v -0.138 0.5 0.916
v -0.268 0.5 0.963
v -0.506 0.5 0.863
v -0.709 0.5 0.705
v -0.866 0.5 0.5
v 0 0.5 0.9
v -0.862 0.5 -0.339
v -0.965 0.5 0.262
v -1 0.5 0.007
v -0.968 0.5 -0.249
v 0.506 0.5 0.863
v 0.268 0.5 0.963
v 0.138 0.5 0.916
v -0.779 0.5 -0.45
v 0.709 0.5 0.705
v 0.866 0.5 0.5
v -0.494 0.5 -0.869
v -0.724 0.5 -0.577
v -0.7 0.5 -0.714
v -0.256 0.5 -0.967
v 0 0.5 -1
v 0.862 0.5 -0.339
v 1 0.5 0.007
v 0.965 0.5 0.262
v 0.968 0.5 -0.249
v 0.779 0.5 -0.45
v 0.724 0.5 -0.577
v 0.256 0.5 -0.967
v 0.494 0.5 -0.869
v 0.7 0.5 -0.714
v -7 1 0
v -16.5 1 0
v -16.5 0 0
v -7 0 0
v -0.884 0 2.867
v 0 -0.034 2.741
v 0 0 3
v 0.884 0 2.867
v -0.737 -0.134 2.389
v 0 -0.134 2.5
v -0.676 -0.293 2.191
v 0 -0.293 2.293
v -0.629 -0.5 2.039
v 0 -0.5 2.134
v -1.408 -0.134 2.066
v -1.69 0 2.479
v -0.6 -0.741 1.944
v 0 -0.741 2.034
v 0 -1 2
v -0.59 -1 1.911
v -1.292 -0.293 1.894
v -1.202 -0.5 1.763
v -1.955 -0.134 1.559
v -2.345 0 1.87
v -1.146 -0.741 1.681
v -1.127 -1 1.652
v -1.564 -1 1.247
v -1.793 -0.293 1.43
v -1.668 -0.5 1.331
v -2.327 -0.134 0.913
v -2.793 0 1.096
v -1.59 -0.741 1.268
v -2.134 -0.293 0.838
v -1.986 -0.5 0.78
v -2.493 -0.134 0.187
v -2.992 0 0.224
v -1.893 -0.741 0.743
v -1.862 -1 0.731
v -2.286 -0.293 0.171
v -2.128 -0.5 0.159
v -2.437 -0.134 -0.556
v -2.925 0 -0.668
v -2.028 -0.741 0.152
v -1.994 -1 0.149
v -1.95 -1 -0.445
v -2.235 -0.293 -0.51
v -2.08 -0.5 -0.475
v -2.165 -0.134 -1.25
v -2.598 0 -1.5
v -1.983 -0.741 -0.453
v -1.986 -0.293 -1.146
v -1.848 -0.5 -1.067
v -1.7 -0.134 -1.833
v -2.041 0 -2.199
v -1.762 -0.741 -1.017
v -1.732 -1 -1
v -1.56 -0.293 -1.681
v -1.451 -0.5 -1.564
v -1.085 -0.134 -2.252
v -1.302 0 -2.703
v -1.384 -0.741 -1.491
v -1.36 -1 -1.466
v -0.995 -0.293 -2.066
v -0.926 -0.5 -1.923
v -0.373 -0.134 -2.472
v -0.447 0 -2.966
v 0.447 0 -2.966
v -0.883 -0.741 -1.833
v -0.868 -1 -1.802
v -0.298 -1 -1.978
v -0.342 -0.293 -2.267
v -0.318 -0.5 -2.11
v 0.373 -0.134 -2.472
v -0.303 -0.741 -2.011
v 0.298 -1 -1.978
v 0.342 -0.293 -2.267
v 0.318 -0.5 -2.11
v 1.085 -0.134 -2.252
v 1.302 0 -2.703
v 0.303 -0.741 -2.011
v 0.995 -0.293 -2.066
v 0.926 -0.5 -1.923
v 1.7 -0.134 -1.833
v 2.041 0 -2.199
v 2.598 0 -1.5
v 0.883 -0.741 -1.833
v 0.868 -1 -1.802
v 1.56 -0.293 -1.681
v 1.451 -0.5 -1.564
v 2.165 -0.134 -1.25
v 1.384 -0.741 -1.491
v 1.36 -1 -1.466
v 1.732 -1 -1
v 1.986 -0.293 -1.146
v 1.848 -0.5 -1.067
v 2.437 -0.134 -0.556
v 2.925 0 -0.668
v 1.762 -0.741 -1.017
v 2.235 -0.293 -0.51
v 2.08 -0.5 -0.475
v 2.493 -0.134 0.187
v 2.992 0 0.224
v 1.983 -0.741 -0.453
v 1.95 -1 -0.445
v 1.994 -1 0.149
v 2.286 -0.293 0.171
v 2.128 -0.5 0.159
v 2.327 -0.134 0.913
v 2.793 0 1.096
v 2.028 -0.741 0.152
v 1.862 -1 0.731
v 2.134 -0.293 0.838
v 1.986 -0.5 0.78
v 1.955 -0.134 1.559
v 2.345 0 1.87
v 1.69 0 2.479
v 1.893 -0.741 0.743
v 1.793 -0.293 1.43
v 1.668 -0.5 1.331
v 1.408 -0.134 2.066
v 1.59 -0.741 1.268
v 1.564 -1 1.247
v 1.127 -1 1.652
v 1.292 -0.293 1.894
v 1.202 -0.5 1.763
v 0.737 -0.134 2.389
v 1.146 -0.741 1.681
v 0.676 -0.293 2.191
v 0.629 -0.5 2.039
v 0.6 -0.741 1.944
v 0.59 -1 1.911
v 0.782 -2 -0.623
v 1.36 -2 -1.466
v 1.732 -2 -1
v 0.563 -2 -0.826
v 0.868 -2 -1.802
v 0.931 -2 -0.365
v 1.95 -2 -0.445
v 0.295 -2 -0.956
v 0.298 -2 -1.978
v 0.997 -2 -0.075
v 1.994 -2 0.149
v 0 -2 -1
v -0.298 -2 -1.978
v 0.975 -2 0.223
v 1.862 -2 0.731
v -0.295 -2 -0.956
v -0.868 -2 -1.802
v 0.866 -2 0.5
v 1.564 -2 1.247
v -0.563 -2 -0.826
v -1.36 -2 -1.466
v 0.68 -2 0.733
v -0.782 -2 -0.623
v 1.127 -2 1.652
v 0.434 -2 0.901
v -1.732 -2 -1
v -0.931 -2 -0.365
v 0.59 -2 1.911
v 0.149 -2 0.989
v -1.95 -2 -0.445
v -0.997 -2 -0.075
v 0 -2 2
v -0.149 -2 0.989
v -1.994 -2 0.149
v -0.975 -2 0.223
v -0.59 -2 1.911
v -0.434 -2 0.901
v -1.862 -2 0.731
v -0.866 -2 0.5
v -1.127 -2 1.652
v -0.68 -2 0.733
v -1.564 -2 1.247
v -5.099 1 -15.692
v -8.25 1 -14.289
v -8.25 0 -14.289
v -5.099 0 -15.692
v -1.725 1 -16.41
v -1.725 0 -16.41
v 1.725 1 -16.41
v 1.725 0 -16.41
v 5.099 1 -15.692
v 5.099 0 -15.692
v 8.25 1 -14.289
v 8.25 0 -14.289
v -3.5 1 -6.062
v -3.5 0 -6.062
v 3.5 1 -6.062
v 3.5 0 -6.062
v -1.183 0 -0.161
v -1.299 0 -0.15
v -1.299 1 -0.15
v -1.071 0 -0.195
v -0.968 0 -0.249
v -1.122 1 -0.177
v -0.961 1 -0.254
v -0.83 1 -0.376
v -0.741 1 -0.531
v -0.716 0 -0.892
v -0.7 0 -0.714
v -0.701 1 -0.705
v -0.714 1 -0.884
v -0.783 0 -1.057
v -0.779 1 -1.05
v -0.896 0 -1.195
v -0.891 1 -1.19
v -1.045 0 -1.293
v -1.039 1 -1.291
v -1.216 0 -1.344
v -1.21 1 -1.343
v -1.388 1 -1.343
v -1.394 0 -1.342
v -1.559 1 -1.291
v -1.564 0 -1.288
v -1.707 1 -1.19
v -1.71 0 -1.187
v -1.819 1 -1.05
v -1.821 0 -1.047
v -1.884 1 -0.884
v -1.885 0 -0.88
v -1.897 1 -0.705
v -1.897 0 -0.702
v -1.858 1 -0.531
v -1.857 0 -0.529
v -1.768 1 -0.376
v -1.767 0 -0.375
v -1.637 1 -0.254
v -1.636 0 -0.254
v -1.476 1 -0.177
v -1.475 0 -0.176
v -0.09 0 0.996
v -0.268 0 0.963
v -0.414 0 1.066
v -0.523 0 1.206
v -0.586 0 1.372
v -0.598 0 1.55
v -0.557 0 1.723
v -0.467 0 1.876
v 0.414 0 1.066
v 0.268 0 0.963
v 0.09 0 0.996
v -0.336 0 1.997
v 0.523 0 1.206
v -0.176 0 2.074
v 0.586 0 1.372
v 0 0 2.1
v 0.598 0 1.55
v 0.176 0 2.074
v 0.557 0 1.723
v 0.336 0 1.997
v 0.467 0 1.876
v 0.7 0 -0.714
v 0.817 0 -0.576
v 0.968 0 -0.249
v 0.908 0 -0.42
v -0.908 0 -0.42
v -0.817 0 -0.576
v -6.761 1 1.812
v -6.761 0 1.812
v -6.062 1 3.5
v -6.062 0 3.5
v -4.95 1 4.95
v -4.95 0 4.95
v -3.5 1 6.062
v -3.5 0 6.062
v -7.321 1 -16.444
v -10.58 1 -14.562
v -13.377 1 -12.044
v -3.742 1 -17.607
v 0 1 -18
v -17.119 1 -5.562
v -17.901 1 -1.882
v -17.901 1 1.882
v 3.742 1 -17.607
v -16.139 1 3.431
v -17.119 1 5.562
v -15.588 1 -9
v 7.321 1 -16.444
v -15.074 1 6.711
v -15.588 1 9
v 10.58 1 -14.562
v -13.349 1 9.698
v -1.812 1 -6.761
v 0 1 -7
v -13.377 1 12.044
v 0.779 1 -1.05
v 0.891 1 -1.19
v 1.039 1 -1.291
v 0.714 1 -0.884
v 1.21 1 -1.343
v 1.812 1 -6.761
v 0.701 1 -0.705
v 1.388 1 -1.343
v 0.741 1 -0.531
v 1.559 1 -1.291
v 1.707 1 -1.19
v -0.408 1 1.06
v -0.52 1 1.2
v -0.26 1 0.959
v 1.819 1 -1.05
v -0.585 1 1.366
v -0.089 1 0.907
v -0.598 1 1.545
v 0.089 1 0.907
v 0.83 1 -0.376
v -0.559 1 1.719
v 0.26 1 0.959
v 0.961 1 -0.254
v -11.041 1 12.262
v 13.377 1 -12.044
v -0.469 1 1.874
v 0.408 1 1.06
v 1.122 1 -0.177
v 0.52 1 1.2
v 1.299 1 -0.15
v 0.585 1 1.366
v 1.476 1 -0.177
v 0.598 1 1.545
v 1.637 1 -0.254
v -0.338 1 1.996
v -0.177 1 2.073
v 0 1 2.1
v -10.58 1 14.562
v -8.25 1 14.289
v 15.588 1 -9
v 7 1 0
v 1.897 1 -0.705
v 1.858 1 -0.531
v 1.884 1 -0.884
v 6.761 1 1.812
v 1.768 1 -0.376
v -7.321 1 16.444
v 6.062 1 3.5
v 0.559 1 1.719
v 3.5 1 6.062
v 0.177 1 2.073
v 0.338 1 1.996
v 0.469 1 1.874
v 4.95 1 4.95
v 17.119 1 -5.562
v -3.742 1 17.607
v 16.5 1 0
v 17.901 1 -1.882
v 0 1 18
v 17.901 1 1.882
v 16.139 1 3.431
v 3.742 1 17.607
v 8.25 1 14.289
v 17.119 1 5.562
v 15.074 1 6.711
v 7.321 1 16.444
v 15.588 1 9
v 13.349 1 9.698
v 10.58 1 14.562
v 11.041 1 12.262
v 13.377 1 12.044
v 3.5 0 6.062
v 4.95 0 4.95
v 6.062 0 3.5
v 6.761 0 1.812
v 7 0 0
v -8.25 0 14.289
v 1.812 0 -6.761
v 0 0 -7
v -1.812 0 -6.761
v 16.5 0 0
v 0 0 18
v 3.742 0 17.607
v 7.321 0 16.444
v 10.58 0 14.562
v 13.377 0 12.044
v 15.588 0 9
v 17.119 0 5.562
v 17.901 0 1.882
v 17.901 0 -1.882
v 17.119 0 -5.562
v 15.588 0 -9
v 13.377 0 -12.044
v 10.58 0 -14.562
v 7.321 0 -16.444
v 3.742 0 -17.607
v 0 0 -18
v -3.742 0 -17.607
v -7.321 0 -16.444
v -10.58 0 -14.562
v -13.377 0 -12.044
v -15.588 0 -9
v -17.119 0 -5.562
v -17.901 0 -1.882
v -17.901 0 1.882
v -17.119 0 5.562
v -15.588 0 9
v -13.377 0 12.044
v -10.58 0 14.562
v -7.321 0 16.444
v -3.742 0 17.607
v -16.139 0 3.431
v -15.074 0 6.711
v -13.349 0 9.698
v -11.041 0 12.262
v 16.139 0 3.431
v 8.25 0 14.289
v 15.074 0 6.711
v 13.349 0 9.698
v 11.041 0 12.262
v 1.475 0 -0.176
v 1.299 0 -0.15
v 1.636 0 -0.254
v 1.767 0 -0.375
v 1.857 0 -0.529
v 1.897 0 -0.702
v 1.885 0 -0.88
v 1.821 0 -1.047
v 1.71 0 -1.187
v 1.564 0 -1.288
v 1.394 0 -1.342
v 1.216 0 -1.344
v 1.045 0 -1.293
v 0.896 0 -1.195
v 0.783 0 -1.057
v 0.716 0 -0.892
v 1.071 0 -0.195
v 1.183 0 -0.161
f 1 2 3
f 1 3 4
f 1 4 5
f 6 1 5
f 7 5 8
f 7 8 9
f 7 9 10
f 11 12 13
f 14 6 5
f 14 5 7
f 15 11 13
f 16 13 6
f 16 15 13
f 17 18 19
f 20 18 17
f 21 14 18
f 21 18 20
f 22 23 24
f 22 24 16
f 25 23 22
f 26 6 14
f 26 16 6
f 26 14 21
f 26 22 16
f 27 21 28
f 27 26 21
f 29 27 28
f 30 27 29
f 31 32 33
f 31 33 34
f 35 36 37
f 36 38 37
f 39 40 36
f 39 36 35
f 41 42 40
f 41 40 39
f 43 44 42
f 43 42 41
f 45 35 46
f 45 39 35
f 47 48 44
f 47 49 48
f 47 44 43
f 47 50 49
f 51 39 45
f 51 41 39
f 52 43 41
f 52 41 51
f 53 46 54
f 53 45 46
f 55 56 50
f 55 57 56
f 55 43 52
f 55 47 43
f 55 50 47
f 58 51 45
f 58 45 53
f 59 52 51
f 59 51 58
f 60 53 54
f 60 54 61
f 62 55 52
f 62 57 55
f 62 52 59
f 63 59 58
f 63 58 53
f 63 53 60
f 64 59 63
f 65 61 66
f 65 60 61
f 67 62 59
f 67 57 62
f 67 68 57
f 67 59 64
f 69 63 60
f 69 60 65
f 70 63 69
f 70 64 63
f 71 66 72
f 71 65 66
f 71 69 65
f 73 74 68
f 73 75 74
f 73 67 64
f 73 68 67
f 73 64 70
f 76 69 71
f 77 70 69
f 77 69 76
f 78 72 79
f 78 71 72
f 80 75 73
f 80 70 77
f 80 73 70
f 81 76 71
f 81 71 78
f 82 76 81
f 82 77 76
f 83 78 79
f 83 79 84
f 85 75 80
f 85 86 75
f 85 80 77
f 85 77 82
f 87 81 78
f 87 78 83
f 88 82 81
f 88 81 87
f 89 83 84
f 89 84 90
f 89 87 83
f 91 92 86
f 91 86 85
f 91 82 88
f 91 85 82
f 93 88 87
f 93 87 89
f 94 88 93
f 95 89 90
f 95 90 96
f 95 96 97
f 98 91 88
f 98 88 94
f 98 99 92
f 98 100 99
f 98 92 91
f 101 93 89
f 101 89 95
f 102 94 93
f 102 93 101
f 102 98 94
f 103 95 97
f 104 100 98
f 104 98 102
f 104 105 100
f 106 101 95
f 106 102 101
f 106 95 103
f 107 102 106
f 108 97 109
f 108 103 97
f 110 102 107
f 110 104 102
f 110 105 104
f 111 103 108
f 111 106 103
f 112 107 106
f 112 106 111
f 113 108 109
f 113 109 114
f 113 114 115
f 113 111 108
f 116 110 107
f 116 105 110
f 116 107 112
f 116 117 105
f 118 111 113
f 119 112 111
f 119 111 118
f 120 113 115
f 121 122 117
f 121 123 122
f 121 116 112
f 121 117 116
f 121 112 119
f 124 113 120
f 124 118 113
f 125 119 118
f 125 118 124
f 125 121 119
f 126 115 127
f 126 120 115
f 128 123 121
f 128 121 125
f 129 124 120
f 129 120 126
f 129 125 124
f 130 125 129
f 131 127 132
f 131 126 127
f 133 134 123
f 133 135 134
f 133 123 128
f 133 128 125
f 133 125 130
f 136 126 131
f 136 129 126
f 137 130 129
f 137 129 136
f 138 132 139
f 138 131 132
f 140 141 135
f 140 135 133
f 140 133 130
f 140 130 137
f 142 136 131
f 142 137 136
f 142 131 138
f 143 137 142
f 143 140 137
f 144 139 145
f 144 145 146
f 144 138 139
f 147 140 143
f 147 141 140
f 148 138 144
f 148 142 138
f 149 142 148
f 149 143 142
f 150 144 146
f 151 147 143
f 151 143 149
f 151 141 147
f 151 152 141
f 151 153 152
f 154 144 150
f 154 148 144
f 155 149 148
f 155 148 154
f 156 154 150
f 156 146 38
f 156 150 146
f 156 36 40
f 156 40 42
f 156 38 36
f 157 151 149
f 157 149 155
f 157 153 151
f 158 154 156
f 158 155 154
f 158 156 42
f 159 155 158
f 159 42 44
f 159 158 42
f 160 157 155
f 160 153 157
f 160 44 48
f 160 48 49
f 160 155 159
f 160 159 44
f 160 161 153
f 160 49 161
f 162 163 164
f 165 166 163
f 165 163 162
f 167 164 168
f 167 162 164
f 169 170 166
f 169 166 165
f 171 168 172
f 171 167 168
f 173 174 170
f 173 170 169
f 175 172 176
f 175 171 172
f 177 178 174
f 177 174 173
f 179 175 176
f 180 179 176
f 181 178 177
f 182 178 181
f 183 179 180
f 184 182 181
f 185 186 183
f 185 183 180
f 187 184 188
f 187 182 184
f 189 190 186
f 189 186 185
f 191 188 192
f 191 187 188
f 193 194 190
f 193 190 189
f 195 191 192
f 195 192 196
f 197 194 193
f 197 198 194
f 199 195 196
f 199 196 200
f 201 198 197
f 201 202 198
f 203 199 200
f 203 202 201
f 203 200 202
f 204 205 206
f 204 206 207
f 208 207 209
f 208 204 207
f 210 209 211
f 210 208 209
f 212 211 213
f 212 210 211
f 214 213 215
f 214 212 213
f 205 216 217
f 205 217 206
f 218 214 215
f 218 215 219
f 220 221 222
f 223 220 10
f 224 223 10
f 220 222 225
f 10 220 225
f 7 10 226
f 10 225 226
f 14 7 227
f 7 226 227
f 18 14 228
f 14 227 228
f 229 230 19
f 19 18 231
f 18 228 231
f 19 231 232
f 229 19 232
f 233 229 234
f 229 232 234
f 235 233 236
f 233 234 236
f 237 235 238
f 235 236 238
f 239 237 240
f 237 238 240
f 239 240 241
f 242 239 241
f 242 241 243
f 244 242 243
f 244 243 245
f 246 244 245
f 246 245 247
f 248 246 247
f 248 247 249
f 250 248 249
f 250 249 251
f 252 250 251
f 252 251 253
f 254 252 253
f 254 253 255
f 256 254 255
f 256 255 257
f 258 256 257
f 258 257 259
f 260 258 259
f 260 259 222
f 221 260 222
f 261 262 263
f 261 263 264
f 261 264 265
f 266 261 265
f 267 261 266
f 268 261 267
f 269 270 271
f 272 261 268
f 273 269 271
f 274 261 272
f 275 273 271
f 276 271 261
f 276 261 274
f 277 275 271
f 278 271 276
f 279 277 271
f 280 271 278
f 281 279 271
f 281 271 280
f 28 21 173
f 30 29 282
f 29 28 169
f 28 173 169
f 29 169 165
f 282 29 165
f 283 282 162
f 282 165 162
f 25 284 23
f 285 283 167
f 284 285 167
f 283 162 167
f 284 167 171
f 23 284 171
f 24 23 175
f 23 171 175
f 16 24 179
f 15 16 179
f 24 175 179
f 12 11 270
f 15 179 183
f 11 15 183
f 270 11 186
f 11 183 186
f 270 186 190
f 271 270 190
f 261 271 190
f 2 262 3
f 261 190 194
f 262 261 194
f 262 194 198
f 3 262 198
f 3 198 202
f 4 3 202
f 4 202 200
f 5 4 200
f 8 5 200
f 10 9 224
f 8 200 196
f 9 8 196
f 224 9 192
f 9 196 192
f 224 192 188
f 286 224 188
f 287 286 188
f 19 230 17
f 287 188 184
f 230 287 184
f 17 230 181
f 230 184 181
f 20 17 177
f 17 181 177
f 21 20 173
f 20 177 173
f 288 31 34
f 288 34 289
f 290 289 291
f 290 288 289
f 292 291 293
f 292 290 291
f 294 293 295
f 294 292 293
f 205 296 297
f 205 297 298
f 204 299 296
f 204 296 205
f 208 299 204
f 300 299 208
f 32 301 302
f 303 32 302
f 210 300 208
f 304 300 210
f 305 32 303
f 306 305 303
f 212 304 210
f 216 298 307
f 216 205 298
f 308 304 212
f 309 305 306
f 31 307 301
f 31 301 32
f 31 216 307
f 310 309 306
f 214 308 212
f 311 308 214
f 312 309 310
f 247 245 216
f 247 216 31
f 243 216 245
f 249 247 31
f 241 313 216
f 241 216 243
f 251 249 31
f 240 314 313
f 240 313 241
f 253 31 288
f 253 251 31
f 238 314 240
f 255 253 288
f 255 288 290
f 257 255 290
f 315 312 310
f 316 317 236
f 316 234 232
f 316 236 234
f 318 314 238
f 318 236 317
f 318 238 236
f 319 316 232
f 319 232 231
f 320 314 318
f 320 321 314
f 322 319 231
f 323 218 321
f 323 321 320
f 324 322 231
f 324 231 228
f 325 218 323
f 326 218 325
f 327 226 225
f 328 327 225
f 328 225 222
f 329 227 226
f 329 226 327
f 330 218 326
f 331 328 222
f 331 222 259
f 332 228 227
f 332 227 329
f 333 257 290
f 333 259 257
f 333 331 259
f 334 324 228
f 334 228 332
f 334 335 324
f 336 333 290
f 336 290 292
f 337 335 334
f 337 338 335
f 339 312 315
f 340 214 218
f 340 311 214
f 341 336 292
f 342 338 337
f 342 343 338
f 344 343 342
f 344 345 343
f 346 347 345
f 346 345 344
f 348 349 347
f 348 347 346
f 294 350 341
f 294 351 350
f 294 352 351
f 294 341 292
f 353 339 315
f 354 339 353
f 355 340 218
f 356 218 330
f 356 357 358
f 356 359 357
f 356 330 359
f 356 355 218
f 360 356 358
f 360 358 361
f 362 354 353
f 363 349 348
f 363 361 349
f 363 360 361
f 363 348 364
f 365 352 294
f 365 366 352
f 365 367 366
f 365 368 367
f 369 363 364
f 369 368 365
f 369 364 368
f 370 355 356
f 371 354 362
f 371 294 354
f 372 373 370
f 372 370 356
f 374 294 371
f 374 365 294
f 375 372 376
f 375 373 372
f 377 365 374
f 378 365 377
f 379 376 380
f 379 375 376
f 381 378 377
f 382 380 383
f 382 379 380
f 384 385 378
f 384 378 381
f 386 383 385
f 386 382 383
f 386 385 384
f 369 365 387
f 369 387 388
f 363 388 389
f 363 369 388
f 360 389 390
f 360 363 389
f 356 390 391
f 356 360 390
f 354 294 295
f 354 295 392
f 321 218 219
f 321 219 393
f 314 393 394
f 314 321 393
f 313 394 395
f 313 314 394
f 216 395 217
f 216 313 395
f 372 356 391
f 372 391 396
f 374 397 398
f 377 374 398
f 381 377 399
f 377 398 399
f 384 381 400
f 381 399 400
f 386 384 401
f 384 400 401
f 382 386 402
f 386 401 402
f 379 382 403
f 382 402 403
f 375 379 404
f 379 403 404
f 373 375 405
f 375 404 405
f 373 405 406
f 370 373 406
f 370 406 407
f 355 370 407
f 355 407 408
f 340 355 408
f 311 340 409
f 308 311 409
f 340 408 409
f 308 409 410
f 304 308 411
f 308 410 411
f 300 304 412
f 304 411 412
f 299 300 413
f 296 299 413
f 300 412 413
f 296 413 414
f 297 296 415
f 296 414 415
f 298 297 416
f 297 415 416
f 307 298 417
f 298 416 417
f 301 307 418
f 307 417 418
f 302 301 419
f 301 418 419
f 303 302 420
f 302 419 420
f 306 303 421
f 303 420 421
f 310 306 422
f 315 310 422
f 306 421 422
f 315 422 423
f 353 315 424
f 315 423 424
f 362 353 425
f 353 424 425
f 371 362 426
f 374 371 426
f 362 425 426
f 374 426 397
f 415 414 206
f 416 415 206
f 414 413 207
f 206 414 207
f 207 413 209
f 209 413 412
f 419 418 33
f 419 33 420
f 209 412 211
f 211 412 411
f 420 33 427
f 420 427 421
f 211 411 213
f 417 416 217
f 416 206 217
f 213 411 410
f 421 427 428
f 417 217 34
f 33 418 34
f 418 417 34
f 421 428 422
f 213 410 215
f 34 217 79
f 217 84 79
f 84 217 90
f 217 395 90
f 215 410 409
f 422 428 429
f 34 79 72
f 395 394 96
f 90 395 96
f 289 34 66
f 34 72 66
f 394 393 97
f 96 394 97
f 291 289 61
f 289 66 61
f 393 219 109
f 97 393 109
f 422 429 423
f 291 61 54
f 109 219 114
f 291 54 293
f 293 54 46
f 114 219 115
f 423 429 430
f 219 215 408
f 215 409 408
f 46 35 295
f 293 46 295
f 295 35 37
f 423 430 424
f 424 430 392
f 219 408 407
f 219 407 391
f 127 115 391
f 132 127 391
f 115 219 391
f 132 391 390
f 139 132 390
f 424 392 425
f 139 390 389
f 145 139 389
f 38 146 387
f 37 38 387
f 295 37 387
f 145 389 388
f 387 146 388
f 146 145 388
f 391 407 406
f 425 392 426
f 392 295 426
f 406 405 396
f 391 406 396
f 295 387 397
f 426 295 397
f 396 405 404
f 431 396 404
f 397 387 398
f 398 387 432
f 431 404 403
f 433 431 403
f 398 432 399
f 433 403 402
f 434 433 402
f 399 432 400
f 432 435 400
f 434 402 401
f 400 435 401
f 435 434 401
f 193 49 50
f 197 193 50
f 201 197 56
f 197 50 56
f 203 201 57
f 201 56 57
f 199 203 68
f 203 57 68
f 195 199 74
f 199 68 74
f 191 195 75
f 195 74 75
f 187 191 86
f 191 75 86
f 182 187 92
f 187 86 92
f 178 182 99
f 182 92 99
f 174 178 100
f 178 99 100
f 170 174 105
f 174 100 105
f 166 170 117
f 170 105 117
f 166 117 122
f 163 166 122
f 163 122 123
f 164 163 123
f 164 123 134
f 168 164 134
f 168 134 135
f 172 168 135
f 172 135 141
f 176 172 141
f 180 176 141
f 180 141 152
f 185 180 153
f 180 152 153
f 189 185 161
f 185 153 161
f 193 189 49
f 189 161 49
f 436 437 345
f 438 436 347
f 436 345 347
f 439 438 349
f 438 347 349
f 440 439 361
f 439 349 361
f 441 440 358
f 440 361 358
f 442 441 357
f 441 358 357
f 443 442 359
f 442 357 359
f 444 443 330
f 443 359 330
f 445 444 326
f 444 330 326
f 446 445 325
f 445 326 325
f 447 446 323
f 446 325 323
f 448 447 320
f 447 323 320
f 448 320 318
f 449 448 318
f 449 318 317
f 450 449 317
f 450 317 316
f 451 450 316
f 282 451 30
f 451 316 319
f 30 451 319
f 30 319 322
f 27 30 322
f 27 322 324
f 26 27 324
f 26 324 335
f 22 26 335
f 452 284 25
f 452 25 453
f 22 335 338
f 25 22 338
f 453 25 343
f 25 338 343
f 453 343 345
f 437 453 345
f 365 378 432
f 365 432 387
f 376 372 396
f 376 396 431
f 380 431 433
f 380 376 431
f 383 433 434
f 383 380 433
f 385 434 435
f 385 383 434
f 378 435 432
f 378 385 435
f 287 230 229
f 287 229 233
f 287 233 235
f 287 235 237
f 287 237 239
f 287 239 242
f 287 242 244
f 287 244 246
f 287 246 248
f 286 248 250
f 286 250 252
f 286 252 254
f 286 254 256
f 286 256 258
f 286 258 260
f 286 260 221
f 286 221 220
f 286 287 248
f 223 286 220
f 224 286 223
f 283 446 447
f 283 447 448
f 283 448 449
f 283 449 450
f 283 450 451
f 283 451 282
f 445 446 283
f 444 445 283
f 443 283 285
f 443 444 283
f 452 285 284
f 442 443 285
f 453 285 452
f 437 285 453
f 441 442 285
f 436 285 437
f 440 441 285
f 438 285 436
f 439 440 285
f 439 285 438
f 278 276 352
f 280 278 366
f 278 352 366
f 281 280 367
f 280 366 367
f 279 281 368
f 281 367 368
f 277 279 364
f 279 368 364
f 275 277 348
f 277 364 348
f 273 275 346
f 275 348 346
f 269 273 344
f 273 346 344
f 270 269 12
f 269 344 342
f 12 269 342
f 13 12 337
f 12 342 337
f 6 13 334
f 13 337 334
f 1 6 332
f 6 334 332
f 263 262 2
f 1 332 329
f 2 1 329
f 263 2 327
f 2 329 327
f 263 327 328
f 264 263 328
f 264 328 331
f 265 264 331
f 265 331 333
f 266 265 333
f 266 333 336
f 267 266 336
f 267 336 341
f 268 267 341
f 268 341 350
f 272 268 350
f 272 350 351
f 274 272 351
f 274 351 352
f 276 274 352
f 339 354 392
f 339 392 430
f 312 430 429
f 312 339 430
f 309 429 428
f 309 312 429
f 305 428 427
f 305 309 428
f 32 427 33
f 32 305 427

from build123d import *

# Parameters (mm, degrees)
SKETCH1_R           = 18
BOSS_EXTRUDE1_DEPTH = 1
SKETCH2_R           = 2
BOSS_EXTRUDE2_DEPTH = 2
SKETCH3_R           = 1
CUT_EXTRUDE1_DEPTH  = 2.5
FILLET1_R           = 1
SKETCH4_R           = 0.6
CUT_EXTRUDE2_DEPTH  = 1


with BuildPart() as part:
    # Sketch1 → Boss-Extrude1 (new body)
    with BuildSketch(Plane(origin=(0, 0, 0), x_dir=(1, 0, 0), z_dir=(0, 1, 0))):
        with Locations(Location((0, 0, 0), (0, 0, 270))):
            Circle(SKETCH1_R)
    extrude(amount=BOSS_EXTRUDE1_DEPTH)

    # Sketch2 → Boss-Extrude2 (add)
    with BuildSketch(Plane.XZ):
        with Locations(Location((0, 0, 0), (0, 0, 90))):
            Circle(SKETCH2_R)
    extrude(amount=BOSS_EXTRUDE2_DEPTH)

    # Sketch3 → Cut-Extrude1 (cut)
    with BuildSketch(Plane.XZ.offset(2)):
        with Locations(Location((0, 0, 0), (0, 0, 270))):
            Circle(SKETCH3_R)
    extrude(amount=-CUT_EXTRUDE1_DEPTH, mode=Mode.SUBTRACT)

    # Fillet1
    fillet1_edges = [part.edges().sort_by_distance(p)[0] for p in [
        (0, 0, -2),
    ]]
    fillet(fillet1_edges, radius=FILLET1_R)

    # Sketch4 → Cut-Extrude2 (cut)
    with BuildSketch(Plane(origin=(0, 1, 0), x_dir=(1, 0, 0), z_dir=(0, 1, 0))):
        with Locations(Location((1.299038106, 0.75, 0), (0, 0, 270))):
            Circle(SKETCH4_R)
        with Locations(Location((0, -1.5, 0), (0, 0, 270))):
            Circle(SKETCH4_R)
        with Locations(Location((-1.299038106, 0.75, 0), (0, 0, 270))):
            Circle(SKETCH4_R)
        with BuildLine():
            Line((-3.5, 6.062177826), (-8.25, 14.289419162))
            ThreePointArc((-8.25, 14.289419162), (0, 16.5), (8.25, 14.289419162))
            Line((8.25, 14.289419162), (3.5, 6.062177826))
            ThreePointArc((3.5, 6.062177826), (0, 7), (-3.5, 6.062177826))
        make_face()
        with BuildLine():
            Line((7, 0), (16.5, 0))
            ThreePointArc((16.5, 0), (14.289419162, -8.25), (8.25, -14.289419162))
            Line((8.25, -14.289419162), (3.5, -6.062177826))
            ThreePointArc((3.5, -6.062177826), (6.062177826, -3.5), (7, 0))
        make_face()
        with BuildLine():
            Line((-3.5, -6.062177826), (-8.25, -14.289419162))
            ThreePointArc((-8.25, -14.289419162), (-14.289419162, -8.25), (-16.5, 0))
            Line((-16.5, 0), (-7, 0))
            ThreePointArc((-7, 0), (-6.062177826, -3.5), (-3.5, -6.062177826))
        make_face()
    extrude(amount=-CUT_EXTRUDE2_DEPTH, mode=Mode.SUBTRACT)


solid = part.part
